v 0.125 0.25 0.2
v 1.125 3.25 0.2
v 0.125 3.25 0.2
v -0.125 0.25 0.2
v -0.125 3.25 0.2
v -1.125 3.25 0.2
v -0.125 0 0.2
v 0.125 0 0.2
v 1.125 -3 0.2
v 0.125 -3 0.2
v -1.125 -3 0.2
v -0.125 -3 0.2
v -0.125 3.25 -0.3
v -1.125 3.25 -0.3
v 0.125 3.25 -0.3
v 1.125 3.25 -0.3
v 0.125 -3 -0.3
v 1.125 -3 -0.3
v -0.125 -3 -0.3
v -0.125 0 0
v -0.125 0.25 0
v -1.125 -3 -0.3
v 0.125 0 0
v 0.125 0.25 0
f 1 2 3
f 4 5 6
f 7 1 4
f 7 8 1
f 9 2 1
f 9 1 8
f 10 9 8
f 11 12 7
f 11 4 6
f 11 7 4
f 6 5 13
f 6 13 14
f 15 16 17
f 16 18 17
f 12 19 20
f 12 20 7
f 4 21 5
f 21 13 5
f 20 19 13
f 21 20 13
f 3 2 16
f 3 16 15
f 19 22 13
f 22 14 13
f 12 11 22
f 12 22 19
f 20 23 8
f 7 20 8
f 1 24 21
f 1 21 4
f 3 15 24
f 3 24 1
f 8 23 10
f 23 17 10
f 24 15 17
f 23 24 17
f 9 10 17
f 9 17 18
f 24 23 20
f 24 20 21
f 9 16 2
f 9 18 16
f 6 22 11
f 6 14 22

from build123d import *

# Parameters (mm, degrees)
F0_W     = 0.25
F0_H     = 0.2
F1_DEPTH = 0.125
F2_W     = 0.25
F2_H     = 0.5
F3_DEPTH = 1
F4_W     = 0.25
F4_H     = 0.5
F5_DEPTH = 1
F6_W     = 1
F6_H     = 0.5
F7_DEPTH = 3
F8_W     = 1
F8_H     = 0.5
F9_DEPTH = 3


with BuildPart() as f1:
    # F0 (on Right) → F1 (new body, symmetric)
    with BuildSketch(Plane.YZ):
        with Locations((0.125, 0.1)):
            Rectangle(F0_W, F0_H)
    extrude(amount=F1_DEPTH, both=True)

    # F2 (on face) → F3 (join)
    with BuildSketch(Plane.YZ.offset(0.125)):
        with Locations((0.125, -0.05)):
            Rectangle(F2_W, F2_H)
    extrude(amount=F3_DEPTH)

    # F4 (on face) → F5 (join)
    with BuildSketch(Plane(origin=(-0.125, 0, 0), x_dir=(0, -1, 0), z_dir=(-1, 0, 0))):
        with Locations((-0.125, -0.05)):
            Rectangle(F4_W, F4_H)
    extrude(amount=F5_DEPTH)

    # F6 (on face) → F7 (join)
    with BuildSketch(Plane.XZ):
        with Locations((-0.625, -0.05)):
            Rectangle(F6_W, F6_H)
        with Locations((0.625, -0.05)):
            Rectangle(F6_W, F6_H)
    extrude(amount=F7_DEPTH)

    # F8 (on face) → F9 (join)
    with BuildSketch(Plane(origin=(0, 0.25, 0), x_dir=(-1, 0, 0), z_dir=(0, 1, 0))):
        with Locations((-0.625, -0.05)):
            Rectangle(F8_W, F8_H)
        with Locations((0.625, -0.05)):
            Rectangle(F8_W, F8_H)
    extrude(amount=F9_DEPTH)


solid = f1.part
